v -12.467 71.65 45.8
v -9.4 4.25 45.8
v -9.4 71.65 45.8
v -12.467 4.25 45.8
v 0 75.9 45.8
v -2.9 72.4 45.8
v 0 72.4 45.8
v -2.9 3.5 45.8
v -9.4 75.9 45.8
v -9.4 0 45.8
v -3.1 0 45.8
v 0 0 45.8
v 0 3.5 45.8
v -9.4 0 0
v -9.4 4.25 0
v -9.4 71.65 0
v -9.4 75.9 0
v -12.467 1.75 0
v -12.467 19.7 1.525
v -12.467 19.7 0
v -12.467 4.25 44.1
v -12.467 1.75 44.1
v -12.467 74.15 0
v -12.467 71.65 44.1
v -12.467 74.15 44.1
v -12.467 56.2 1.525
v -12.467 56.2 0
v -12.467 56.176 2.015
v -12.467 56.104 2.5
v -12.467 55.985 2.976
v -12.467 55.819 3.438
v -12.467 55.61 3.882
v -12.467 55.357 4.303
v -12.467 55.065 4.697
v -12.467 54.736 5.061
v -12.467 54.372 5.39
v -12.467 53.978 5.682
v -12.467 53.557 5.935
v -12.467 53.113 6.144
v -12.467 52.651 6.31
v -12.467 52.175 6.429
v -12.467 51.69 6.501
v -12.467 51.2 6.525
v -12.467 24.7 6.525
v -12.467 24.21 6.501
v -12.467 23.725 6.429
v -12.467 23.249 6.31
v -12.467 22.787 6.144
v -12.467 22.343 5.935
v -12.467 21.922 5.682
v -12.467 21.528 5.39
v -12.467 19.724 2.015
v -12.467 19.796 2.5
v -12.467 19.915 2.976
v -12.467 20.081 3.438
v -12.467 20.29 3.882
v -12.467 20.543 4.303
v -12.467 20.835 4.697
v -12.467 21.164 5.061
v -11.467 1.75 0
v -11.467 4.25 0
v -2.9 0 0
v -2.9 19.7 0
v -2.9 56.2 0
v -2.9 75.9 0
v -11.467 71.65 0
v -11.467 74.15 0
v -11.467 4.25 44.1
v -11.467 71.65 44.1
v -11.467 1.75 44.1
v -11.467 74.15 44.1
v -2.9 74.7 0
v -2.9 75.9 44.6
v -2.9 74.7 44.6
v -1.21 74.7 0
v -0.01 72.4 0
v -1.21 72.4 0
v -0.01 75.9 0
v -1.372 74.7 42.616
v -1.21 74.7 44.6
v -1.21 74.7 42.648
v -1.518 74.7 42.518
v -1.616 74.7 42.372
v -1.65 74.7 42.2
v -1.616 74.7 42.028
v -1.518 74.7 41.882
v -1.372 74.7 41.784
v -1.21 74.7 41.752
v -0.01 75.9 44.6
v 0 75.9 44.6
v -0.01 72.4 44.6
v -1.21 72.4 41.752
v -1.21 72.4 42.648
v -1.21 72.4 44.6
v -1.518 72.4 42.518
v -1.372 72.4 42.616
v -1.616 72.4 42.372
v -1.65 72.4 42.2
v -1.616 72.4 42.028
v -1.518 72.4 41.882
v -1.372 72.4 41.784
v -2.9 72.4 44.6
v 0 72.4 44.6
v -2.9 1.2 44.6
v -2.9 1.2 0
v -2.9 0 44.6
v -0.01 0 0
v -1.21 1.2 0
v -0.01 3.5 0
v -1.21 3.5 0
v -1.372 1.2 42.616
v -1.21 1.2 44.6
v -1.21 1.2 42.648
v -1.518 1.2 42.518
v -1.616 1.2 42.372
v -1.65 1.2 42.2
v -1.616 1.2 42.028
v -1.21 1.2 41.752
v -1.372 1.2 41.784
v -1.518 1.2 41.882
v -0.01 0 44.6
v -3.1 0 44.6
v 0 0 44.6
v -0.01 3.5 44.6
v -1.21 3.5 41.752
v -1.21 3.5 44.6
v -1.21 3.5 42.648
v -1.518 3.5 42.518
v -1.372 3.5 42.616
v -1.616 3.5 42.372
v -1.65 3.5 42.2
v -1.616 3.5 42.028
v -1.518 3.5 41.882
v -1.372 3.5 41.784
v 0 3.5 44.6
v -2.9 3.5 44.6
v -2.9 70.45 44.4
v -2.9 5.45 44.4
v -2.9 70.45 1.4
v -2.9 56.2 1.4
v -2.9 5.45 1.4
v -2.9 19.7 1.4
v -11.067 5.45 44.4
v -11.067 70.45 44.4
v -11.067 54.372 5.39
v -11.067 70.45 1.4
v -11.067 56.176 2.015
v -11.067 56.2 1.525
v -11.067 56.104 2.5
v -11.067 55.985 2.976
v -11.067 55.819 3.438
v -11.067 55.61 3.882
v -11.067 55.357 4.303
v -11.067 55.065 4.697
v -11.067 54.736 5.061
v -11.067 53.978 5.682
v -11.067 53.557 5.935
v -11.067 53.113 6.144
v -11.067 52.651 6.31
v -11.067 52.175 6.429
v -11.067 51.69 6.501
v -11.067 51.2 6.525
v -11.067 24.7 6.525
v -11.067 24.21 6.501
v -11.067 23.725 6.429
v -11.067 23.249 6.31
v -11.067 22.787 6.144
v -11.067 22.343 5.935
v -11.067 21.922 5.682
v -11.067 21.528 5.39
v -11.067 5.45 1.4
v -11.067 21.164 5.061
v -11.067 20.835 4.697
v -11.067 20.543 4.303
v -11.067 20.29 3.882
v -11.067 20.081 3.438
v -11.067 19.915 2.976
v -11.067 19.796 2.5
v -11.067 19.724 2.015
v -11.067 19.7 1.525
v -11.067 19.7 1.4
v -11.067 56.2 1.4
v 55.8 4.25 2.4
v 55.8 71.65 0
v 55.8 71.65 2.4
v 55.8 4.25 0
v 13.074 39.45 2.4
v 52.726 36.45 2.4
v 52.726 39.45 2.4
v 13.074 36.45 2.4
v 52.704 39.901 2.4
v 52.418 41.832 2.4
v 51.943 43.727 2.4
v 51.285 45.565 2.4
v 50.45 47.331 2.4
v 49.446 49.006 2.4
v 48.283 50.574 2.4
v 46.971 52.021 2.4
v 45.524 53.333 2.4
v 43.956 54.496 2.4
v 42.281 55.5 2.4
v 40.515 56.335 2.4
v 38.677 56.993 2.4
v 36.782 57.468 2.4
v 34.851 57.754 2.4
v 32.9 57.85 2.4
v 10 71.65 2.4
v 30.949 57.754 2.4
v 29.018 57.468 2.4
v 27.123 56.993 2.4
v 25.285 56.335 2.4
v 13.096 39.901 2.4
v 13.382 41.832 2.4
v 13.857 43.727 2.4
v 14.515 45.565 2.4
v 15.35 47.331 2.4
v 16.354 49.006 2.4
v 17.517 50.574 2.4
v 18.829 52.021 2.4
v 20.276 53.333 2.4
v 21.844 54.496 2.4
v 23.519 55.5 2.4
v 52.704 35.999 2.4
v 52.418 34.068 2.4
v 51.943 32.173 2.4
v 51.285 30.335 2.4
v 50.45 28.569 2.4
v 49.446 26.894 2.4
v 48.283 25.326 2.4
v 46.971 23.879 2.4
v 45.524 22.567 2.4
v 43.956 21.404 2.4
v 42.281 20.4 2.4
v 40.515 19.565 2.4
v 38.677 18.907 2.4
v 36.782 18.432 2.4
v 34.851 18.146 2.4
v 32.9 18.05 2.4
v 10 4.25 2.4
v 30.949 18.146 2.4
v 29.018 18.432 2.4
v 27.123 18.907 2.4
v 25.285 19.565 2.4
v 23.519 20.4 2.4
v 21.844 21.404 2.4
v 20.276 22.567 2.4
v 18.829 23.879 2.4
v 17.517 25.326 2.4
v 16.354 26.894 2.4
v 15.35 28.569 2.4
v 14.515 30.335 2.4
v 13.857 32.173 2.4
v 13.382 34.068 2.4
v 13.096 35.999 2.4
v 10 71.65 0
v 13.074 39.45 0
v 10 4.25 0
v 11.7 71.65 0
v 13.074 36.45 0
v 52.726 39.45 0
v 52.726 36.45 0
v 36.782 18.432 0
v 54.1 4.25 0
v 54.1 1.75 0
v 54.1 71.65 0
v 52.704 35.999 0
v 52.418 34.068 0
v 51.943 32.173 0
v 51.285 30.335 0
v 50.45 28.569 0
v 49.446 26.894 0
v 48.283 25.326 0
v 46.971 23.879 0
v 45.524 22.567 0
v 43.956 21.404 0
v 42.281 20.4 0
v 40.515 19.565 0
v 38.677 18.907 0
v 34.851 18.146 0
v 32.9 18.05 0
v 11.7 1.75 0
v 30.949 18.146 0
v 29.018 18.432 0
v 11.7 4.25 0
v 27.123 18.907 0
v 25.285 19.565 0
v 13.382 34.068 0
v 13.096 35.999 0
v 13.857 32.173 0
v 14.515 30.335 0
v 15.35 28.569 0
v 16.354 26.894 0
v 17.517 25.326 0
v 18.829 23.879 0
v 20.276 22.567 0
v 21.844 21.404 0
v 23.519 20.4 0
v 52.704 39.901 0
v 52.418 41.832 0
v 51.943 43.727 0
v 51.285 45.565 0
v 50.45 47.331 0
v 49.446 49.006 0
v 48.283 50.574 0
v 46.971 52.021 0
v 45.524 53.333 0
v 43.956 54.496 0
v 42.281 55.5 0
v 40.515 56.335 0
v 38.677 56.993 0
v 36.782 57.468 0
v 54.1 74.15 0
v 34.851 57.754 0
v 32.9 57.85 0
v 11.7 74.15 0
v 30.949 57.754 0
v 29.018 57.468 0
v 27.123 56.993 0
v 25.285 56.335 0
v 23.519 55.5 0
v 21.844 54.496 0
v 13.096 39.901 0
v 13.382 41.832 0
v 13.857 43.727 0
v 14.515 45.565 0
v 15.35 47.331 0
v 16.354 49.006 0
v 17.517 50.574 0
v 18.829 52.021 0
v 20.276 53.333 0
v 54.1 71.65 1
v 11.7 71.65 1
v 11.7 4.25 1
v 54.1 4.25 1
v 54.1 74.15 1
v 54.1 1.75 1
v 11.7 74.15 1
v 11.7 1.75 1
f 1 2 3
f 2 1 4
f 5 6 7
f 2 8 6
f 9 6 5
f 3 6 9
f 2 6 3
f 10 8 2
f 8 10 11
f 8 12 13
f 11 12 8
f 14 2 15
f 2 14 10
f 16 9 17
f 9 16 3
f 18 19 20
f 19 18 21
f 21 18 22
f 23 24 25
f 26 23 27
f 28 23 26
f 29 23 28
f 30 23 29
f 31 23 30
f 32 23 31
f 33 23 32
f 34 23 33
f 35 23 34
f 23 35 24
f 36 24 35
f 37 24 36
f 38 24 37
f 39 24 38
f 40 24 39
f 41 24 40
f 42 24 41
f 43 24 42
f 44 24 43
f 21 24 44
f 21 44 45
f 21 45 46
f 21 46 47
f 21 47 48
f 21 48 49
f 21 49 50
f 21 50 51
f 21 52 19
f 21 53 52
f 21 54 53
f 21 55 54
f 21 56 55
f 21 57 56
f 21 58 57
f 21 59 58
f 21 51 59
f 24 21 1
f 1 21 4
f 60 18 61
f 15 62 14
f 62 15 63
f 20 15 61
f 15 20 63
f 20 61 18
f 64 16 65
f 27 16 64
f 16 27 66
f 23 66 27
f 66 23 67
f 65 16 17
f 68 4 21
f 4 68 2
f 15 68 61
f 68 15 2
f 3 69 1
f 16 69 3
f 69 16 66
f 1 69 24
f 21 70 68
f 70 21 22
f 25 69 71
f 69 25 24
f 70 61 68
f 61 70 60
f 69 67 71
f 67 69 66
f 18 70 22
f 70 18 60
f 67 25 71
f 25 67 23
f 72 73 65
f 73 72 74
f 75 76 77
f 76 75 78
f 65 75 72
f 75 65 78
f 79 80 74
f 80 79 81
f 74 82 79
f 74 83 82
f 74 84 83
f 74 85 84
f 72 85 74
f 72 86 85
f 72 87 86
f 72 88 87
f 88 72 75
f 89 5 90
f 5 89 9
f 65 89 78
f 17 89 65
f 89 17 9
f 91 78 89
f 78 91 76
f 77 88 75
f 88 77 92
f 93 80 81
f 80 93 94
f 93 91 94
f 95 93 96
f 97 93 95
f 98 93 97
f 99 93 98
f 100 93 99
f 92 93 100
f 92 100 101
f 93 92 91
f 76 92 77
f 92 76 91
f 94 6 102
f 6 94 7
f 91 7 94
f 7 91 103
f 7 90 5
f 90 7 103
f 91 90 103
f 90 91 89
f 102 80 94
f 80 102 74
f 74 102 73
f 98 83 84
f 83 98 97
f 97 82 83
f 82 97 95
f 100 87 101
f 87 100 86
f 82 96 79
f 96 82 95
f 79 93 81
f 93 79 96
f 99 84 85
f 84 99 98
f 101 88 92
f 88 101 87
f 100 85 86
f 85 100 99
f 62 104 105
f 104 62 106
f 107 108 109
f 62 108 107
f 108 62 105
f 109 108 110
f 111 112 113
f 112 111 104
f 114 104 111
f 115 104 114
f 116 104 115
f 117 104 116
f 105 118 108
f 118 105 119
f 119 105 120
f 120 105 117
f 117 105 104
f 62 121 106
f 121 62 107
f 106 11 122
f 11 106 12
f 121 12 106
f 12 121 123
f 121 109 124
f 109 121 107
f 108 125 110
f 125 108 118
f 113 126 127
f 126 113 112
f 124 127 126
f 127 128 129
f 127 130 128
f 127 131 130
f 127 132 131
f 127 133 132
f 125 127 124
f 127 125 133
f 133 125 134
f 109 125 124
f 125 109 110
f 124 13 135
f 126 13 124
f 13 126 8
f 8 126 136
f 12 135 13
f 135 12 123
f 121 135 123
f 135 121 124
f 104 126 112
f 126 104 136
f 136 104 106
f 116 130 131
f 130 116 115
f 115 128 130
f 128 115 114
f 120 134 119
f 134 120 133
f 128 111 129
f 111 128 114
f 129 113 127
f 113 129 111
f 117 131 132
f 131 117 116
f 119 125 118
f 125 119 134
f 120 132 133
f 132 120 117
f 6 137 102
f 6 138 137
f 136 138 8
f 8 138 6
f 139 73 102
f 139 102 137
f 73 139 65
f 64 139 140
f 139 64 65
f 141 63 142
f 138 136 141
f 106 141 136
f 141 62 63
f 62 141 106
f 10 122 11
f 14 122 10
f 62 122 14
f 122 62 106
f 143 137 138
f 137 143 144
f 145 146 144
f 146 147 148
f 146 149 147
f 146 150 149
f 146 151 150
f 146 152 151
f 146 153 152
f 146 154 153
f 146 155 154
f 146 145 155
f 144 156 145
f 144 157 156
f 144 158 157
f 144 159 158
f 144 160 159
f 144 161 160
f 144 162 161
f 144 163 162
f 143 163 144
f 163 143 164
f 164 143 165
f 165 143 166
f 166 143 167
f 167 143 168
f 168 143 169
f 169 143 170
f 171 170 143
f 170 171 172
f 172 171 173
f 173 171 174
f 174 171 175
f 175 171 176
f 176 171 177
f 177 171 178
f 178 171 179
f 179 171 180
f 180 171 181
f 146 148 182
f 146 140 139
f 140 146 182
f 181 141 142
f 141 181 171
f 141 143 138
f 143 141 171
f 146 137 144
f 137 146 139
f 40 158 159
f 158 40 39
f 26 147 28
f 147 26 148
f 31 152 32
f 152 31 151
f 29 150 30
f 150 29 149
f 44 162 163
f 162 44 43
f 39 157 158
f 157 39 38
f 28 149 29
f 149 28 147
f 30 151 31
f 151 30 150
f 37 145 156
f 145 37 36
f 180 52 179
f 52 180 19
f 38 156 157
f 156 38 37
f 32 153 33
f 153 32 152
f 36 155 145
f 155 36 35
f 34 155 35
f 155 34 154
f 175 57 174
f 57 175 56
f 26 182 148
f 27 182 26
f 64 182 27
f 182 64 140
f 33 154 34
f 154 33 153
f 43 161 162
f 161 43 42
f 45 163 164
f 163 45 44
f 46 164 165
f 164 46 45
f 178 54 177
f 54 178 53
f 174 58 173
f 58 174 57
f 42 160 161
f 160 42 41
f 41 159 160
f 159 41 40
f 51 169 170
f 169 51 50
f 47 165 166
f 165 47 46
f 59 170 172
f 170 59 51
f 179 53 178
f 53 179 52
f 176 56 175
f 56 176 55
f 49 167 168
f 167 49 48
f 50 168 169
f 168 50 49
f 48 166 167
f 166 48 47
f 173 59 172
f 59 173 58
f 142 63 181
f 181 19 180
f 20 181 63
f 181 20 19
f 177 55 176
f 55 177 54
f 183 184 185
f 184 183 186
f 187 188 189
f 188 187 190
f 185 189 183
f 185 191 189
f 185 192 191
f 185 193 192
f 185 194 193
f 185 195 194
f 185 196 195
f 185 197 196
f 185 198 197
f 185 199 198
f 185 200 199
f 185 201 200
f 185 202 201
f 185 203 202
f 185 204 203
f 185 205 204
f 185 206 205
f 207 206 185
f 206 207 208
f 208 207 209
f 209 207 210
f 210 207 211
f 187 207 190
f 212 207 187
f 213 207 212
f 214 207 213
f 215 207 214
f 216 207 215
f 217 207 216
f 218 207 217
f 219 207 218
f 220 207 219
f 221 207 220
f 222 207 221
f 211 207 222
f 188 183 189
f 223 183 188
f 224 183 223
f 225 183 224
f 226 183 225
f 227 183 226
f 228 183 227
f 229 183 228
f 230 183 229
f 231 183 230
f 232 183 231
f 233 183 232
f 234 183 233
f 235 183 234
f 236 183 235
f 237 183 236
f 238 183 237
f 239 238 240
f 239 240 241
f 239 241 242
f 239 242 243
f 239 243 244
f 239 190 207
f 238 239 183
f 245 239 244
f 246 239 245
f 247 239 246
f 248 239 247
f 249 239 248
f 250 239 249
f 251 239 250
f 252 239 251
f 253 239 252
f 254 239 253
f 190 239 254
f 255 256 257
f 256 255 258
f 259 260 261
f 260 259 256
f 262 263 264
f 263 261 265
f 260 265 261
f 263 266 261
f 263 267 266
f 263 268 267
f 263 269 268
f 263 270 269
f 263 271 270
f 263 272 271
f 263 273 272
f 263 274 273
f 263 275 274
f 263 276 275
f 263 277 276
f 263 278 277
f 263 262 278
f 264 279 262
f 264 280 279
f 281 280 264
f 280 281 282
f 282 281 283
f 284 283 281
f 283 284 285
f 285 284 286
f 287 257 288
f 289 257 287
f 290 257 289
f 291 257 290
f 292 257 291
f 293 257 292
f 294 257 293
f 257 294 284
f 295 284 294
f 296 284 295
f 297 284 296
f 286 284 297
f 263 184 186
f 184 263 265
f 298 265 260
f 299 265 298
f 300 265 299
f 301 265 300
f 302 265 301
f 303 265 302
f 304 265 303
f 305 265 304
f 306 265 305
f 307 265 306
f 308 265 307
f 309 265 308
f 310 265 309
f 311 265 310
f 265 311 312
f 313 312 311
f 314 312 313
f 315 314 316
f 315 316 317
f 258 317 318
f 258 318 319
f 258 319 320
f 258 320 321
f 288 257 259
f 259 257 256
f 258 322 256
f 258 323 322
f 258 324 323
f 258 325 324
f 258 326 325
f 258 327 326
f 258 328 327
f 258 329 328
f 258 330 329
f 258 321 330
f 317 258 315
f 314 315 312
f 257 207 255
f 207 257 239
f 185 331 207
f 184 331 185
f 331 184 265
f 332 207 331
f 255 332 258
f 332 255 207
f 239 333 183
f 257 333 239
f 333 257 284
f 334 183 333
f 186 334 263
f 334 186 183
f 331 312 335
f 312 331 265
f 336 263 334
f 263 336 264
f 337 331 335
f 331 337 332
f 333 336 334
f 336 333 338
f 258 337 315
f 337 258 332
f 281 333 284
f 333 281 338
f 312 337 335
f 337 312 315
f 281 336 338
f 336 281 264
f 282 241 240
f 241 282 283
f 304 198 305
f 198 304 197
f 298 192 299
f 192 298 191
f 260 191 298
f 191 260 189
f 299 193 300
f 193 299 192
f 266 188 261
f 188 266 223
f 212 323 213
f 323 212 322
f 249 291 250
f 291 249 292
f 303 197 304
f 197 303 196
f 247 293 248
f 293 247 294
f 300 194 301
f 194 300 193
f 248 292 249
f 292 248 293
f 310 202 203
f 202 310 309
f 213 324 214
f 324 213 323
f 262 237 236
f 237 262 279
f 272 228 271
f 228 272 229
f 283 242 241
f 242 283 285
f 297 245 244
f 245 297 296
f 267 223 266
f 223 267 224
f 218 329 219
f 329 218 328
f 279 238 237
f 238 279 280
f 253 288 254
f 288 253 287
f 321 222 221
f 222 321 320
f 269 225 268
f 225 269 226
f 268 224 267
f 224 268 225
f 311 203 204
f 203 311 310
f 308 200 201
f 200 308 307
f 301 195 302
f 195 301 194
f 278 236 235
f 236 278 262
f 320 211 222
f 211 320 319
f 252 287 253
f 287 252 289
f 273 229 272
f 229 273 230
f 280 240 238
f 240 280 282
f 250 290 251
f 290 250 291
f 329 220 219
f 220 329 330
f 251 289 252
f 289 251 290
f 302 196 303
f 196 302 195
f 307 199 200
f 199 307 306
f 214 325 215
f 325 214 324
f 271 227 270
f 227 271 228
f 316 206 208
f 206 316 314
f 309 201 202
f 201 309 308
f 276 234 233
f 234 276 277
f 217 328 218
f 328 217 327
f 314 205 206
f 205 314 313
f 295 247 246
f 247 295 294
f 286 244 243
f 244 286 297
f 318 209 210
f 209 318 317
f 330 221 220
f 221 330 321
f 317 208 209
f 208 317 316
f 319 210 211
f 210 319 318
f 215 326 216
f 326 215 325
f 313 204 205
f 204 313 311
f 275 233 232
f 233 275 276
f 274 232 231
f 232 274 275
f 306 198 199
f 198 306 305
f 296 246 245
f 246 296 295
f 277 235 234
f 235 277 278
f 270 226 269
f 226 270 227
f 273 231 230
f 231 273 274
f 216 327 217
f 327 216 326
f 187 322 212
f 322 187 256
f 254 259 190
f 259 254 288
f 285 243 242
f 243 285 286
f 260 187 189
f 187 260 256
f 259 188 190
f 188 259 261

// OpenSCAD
/*
 * Author:  Jean Philippe Neumann
 * License: Creative Commons Attribution-ShareAlike 3.0 Unported License
 *          see http://creativecommons.org/licenses/by-sa/3.0/
 * URL:     http://www.thingiverse.com/thing:94611
 */
 
// MakerBot customizer settings:
// preview[view:south east, tilt:top diagonal]

/*
 * parameters
 */

/* [primary parameters] */

// how many card holders to print
numberOfHolders = 1;
// how many lids to print
numberOfLids = 1;

// the length of your cards in mm
cardY = 63;
// the width of your cards in mm
cardX = 41;
// the height of the stack of cards you want to store in mm
cardStackZ = 6;

// The fudge factor allows fine tuning the distances between parts in the lock and key mechanisms of the holder. The right value is highly dependent on your printer. Is everything fitting too tight? Try increasing the factor by 0.1. Is everything fitting too loose? Try decreasing the factor by 0.1.
fudgeFactor = 0.5;

/* [secondary parameters] */

longWallStrength = 1.4;
shortWallStrength = 1.2;
bottomWallStrength = 1.4;

// thickness of the lower part of the lock mechanism
lowerLockY = 1.2;
// height of the lower part of the lock mechanism
lowerLockZ = 1.7;
// thickness of the upper part of the lock mechanism
upperLockY = 3.5;
// height of the upper part of the lock mechanism
upperLockZ = 1.2;
// how high is the part of the lid that slides in the locks rail
keyRailZLid = 1.0;
// how high is the part of the holders body that slides in the locks rail
keyRailZBody = 1.0;

// how thick the bit of plastic is that blocks the end of the lock's rail
stopBitStrength = 1.2;
// the "lock nub" is a tiny bump near the end of the lock's rail that makes other holders or lids snap in. This variable sets the size of that nub.
lockNubRadius = 0.45;
// position of the "lock nub"
lockNubDistanceToCorner = 3*stopBitStrength;

// how much extra space to leave around cards
spaceAroundCard = 1;
// how strong the lid's grip is
lidGripStrength = 3;
// how alrge the hole in the lid is
lidHoleRadius = (cardX + 2*spaceAroundCard + 2*longWallStrength)/2 - lidGripStrength;

// distance between objects on the print bed
printDistance = 10;

/* derived parameters */
/* [Hidden] */

release = 1;

// holder main body parameters
bodyX = cardX + 2*spaceAroundCard + 2*longWallStrength;
bodyY = cardY + 2*spaceAroundCard + 2*shortWallStrength + 2*upperLockY + 3*fudgeFactor;
bodyZ = cardStackZ + spaceAroundCard/2;

// lock, key and lid parameters
lockZ = lowerLockZ + upperLockZ;
keyZ = lowerLockZ + upperLockZ + fudgeFactor/3;
lidZ = lowerLockZ + upperLockZ - fudgeFactor;
keyRailX = bodyX - 2*stopBitStrength - 2*fudgeFactor;
keyRailY = upperLockY - lowerLockY + 0.7 - fudgeFactor;
keyMainY = cardY + 2*spaceAroundCard + 2*shortWallStrength;

// space around the card stack
cardSpaceX = cardX + 2*spaceAroundCard;
cardSpaceY = cardY + 2*spaceAroundCard;

// hole in the side of the holder
grabHoleX = longWallStrength + cardX/8;
grabHoleY = cardY * 1/2;

// misc 
holderZ = bodyZ + keyZ + lockZ;

/*
 * putting it all together
 */

if(numberOfHolders != 0) {
	for(i=[0:numberOfHolders-1]) {
		translate([-i*(printDistance + holderZ),0,0])
		
		if(release == 1) {
			translate([-holderZ, bodyY, 0])
			rotate([0,-90,180])
			holder();
		} else {
			translate([-bodyX, 0, 0])
			holder();
		}
	}
}

if(numberOfLids != 0) {
	for(i=[0:numberOfLids-1]) {
		translate([i*(printDistance + bodyX) + printDistance,0,0])
		lid();
	}
}

/*
 * modules
 */

module lid() {
	union() {
		difference() {
			key(bodyX, keyMainY, lidZ, keyRailX, keyRailY, keyRailZLid, true);
			
			translate([bodyX/2, bodyY/2, -1])
			cylinder(h=lidZ+2, r=lidHoleRadius, $fn=64);
		}
		translate([0, (bodyY-lidGripStrength)/2,0])
		cube([bodyX, lidGripStrength ,lidZ]);
	}
}

module key(mainX, mainY, mainZ, railX, railY, railZ, lidMode) {
	railPartY = 2*railY + mainY;
	
	translate([(bodyX-mainX)/2, (bodyY-mainY)/2,0])
	union() {
		color([0.5,0.7,0.9])
		cube([mainX, mainY, mainZ]);
		
		color([0.7,0.7,0.9])
		translate([(mainX-railX)/2,(mainY-railPartY)/2,0])
		cube([railX, railPartY, railZ]);
		
		if(lidMode == false) {
			color([1,0,0])
			translate([0, -(railPartY-mainY)/2, 0])
			cube([(mainX-railX)/2,railPartY,railZ]);
		}
	}
}

module holder() {
	difference() {
		union() {
			key(bodyX, keyMainY, keyZ, keyRailX, keyRailY, keyRailZBody, false);
			
			translate([0,0,keyZ])
			cube([bodyX, bodyY, bodyZ]);
			
			translate([0,0,bodyZ+keyZ])
			lock(bodyX, lowerLockY, lowerLockZ, upperLockY, upperLockZ);
		}
		cardSpace();
		grabHole();
	}
}

module cardSpace() {
	color([1,0,0])
	translate([(bodyX-cardSpaceX)/2,(bodyY-cardSpaceY)/2,bottomWallStrength])
	cube([cardSpaceX, cardSpaceY, bodyZ+keyZ+bottomWallStrength]);
}

module grabHole() {
	cylinderRadius = 5;
	cubeX = grabHoleX-cylinderRadius;
	cubeY = grabHoleY-cylinderRadius;
	posY = (bodyY-cubeY)/2;
	
	$fn=64;
	translate([0, posY, -1])
	minkowski() {
		cube([cubeX, cubeY, bodyZ+keyZ+2]);
		cylinder(r=cylinderRadius, h=1);
	}
}

module lock() {
	union() {
		lockPart();
		mirror([0,1,0]) {
			translate([0,-bodyY,0])
			lockPart();
		}
	}
}

module lockPart() {
	union() {
		// lower lock
		color([0.9,0.4,0.3])
		cube([bodyX, lowerLockY, lowerLockZ]);
		
		// upper lock
		// subtracting 0.01 because of strange holes in the generated STL file
		translate([0,0,lowerLockZ-0.01])
		cube([bodyX, upperLockY, upperLockZ]);
		
		// stop bit
		color([0,1,0])
		// extra large lock bit / translate -Z because of strange holes in the generated STL file
		translate([bodyX-stopBitStrength, 0, -0.2])
		cube([stopBitStrength, upperLockY, lockZ+0.2]);
		
		// safety nub
		color([1,0,0])
		translate([bodyX-lockNubDistanceToCorner, upperLockY, lowerLockZ])
		rotate([90,0,0])
		cylinder(r=lockNubRadius, h=upperLockY, $fn=16);
	}
}
